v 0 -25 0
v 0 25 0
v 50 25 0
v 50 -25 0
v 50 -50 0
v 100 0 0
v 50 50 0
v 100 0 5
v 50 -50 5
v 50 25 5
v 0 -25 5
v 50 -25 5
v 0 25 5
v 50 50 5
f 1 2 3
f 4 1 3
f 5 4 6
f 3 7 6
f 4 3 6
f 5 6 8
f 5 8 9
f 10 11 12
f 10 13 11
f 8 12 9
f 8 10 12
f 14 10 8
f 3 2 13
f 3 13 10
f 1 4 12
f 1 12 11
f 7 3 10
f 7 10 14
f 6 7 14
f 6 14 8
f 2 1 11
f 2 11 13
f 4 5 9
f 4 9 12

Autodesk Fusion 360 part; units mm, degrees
sketch "スケッチ1" plane through (0, 0, 0) normal (0, 0, 1) x (1, 0, 0)
  line L0 (0, 25) -> (50, 25)
  line L1 (50, -25) -> (0, -25)
  line L2 (0, -25) -> (0, 25)
  line L3 (50, 25) -> (50, 50)
  line L4 (50, 50) -> (100, 0)
  line L5 (100, 0) -> (50, -50)
  line L6 (50, -50) -> (50, -25)
  line L7 (0, 0) -> (100, 0) construction
  dimension "d2" = 100
  dimension "d3" = 50
  dimension "d4" = 50
  dimension "d5" = 100
extrude "押し出し1" add sketch "スケッチ1" along normal blind 5
